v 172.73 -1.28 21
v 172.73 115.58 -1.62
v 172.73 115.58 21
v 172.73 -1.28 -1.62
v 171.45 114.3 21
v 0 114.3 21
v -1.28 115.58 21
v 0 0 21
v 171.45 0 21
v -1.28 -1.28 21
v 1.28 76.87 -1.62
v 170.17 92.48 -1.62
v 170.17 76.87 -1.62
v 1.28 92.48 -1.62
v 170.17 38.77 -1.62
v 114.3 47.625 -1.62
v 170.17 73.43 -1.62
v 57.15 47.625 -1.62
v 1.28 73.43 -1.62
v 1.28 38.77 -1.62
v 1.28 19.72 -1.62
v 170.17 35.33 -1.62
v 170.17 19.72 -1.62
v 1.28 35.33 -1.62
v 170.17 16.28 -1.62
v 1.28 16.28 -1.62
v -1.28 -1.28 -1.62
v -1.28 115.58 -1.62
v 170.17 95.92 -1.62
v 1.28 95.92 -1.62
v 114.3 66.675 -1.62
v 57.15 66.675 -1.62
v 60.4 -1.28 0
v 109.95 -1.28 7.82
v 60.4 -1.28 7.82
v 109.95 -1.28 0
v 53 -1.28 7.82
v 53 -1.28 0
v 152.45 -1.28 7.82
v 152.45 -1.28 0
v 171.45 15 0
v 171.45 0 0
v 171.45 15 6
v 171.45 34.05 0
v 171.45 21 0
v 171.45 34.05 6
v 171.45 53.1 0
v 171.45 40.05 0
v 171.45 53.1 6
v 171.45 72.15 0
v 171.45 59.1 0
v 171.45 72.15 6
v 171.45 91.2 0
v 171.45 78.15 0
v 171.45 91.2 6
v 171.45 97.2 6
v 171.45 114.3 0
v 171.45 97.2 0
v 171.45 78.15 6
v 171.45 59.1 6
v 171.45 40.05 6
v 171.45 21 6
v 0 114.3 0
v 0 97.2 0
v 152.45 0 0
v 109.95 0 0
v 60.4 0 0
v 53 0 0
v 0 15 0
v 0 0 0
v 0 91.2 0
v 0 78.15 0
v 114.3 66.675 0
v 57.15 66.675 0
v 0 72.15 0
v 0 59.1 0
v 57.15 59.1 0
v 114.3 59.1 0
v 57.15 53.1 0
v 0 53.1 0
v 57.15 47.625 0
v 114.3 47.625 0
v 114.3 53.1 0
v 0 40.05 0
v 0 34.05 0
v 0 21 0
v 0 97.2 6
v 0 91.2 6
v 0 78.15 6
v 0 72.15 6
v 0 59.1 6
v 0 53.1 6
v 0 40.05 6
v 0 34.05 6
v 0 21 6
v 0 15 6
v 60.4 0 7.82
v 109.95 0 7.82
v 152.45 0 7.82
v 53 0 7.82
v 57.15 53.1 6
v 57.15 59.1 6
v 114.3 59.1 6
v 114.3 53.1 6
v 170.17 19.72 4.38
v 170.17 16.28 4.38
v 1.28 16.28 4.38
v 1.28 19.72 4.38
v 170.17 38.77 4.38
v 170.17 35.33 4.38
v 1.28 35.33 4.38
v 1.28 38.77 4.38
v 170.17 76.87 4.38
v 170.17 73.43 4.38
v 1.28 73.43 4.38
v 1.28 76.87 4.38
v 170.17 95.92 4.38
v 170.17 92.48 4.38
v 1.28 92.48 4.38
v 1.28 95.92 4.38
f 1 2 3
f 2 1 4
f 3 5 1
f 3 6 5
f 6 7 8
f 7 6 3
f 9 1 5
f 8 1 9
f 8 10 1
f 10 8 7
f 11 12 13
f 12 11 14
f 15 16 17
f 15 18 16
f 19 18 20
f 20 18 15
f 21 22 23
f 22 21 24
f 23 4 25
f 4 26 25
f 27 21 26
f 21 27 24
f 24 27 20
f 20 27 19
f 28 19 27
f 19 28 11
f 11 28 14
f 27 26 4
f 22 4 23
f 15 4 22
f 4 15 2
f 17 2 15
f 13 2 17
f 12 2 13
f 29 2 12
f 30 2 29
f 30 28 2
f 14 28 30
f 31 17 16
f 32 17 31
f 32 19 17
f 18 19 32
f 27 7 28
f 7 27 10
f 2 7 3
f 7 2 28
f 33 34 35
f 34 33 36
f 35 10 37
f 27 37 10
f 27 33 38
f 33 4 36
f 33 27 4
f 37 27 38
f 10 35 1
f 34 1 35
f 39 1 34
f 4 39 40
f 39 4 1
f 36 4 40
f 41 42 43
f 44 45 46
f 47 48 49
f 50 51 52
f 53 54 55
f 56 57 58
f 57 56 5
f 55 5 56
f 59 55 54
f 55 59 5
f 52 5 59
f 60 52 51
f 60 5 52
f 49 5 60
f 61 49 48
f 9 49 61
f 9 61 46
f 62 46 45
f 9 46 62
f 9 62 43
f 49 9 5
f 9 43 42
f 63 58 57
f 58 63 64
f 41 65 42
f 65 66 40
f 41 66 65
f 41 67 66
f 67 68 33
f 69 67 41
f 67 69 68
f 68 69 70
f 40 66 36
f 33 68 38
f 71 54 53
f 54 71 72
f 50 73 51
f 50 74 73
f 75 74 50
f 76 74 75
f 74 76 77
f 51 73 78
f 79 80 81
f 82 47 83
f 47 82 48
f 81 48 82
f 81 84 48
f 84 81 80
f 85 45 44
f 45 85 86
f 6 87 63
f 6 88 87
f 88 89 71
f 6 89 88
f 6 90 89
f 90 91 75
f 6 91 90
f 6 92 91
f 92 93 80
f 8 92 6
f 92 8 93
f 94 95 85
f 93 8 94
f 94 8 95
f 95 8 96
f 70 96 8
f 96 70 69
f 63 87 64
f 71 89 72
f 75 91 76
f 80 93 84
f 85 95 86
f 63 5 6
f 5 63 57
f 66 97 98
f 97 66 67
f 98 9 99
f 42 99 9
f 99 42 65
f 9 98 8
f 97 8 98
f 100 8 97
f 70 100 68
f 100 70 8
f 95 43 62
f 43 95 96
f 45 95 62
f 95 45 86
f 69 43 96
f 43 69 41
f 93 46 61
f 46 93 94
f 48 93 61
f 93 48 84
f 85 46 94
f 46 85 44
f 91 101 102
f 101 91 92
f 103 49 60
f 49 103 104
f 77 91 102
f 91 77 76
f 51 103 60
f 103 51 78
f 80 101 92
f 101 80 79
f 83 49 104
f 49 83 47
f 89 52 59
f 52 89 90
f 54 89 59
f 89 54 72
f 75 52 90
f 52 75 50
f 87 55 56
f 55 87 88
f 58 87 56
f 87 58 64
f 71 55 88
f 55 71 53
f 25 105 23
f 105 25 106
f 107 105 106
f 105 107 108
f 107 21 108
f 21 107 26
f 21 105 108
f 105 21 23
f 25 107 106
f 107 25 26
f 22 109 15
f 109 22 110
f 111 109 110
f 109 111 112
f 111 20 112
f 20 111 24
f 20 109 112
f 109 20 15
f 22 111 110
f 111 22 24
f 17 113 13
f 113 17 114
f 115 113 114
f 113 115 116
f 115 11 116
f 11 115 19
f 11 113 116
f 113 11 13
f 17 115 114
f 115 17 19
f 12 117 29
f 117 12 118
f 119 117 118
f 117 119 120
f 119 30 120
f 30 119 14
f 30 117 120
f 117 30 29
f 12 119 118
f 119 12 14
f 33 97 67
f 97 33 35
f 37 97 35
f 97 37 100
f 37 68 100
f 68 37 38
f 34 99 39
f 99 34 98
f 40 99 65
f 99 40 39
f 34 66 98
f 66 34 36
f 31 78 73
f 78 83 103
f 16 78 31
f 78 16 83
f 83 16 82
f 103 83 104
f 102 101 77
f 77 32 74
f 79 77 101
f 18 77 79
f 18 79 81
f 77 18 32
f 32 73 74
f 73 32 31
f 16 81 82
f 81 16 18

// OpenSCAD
// non-design measurements
key_spacing = 19.05;
key_cutout_w = .551 * 25.4;

wall_thicc = 1.28;
pcb_thickness = 1.62;

inner_w = 9 * key_spacing;
inner_l = 6 * key_spacing;
delta_y = 15; //bottom of pcb to edge of keycaps
solder_gap = 6;
inner_h = delta_y + solder_gap;

supp_offset = 15;
supp_width = 21 - 15;
slop = .2;
difference() {
    union() {
        difference() {
            translate([- wall_thicc, - wall_thicc, - pcb_thickness])
                cube([key_spacing * 9 + 2 * wall_thicc, key_spacing * 6 + 2 * wall_thicc, inner_h + pcb_thickness]);
            cube([key_spacing * 9, key_spacing * 6, inner_h + .1]);
        }
        for (i = [0:4]) {
            translate([0, supp_offset + key_spacing * i, -pcb_thickness])
                cube([key_spacing * 9, supp_width, solder_gap+pcb_thickness]);
        }
    }
    //jack hole`
    translate([53.2 - slop, - wall_thicc - .1, 0])
        cube([7 + 2 * slop, wall_thicc + .2, pcb_thickness+solder_gap+slop]);
    //buttons hole`
    translate([inner_w - 19.2 + slop, - wall_thicc - .1, 0])
        mirror([1, 0, 0])
            cube([42.1 + 2 * slop, wall_thicc + .2, solder_gap+pcb_thickness+slop]);
    //logo window
    translate([inner_w / 2, inner_l / 2, - pcb_thickness - .1]) {
        cube([key_spacing * 3, key_spacing, 20], center = true);
    }
    for (i = [0,1,3,4]) {
        translate([wall_thicc, supp_offset + key_spacing * i+wall_thicc, -pcb_thickness-.1])
            cube([key_spacing * 9-2*wall_thicc, supp_width-2*wall_thicc, solder_gap+.1]);
    }
}
